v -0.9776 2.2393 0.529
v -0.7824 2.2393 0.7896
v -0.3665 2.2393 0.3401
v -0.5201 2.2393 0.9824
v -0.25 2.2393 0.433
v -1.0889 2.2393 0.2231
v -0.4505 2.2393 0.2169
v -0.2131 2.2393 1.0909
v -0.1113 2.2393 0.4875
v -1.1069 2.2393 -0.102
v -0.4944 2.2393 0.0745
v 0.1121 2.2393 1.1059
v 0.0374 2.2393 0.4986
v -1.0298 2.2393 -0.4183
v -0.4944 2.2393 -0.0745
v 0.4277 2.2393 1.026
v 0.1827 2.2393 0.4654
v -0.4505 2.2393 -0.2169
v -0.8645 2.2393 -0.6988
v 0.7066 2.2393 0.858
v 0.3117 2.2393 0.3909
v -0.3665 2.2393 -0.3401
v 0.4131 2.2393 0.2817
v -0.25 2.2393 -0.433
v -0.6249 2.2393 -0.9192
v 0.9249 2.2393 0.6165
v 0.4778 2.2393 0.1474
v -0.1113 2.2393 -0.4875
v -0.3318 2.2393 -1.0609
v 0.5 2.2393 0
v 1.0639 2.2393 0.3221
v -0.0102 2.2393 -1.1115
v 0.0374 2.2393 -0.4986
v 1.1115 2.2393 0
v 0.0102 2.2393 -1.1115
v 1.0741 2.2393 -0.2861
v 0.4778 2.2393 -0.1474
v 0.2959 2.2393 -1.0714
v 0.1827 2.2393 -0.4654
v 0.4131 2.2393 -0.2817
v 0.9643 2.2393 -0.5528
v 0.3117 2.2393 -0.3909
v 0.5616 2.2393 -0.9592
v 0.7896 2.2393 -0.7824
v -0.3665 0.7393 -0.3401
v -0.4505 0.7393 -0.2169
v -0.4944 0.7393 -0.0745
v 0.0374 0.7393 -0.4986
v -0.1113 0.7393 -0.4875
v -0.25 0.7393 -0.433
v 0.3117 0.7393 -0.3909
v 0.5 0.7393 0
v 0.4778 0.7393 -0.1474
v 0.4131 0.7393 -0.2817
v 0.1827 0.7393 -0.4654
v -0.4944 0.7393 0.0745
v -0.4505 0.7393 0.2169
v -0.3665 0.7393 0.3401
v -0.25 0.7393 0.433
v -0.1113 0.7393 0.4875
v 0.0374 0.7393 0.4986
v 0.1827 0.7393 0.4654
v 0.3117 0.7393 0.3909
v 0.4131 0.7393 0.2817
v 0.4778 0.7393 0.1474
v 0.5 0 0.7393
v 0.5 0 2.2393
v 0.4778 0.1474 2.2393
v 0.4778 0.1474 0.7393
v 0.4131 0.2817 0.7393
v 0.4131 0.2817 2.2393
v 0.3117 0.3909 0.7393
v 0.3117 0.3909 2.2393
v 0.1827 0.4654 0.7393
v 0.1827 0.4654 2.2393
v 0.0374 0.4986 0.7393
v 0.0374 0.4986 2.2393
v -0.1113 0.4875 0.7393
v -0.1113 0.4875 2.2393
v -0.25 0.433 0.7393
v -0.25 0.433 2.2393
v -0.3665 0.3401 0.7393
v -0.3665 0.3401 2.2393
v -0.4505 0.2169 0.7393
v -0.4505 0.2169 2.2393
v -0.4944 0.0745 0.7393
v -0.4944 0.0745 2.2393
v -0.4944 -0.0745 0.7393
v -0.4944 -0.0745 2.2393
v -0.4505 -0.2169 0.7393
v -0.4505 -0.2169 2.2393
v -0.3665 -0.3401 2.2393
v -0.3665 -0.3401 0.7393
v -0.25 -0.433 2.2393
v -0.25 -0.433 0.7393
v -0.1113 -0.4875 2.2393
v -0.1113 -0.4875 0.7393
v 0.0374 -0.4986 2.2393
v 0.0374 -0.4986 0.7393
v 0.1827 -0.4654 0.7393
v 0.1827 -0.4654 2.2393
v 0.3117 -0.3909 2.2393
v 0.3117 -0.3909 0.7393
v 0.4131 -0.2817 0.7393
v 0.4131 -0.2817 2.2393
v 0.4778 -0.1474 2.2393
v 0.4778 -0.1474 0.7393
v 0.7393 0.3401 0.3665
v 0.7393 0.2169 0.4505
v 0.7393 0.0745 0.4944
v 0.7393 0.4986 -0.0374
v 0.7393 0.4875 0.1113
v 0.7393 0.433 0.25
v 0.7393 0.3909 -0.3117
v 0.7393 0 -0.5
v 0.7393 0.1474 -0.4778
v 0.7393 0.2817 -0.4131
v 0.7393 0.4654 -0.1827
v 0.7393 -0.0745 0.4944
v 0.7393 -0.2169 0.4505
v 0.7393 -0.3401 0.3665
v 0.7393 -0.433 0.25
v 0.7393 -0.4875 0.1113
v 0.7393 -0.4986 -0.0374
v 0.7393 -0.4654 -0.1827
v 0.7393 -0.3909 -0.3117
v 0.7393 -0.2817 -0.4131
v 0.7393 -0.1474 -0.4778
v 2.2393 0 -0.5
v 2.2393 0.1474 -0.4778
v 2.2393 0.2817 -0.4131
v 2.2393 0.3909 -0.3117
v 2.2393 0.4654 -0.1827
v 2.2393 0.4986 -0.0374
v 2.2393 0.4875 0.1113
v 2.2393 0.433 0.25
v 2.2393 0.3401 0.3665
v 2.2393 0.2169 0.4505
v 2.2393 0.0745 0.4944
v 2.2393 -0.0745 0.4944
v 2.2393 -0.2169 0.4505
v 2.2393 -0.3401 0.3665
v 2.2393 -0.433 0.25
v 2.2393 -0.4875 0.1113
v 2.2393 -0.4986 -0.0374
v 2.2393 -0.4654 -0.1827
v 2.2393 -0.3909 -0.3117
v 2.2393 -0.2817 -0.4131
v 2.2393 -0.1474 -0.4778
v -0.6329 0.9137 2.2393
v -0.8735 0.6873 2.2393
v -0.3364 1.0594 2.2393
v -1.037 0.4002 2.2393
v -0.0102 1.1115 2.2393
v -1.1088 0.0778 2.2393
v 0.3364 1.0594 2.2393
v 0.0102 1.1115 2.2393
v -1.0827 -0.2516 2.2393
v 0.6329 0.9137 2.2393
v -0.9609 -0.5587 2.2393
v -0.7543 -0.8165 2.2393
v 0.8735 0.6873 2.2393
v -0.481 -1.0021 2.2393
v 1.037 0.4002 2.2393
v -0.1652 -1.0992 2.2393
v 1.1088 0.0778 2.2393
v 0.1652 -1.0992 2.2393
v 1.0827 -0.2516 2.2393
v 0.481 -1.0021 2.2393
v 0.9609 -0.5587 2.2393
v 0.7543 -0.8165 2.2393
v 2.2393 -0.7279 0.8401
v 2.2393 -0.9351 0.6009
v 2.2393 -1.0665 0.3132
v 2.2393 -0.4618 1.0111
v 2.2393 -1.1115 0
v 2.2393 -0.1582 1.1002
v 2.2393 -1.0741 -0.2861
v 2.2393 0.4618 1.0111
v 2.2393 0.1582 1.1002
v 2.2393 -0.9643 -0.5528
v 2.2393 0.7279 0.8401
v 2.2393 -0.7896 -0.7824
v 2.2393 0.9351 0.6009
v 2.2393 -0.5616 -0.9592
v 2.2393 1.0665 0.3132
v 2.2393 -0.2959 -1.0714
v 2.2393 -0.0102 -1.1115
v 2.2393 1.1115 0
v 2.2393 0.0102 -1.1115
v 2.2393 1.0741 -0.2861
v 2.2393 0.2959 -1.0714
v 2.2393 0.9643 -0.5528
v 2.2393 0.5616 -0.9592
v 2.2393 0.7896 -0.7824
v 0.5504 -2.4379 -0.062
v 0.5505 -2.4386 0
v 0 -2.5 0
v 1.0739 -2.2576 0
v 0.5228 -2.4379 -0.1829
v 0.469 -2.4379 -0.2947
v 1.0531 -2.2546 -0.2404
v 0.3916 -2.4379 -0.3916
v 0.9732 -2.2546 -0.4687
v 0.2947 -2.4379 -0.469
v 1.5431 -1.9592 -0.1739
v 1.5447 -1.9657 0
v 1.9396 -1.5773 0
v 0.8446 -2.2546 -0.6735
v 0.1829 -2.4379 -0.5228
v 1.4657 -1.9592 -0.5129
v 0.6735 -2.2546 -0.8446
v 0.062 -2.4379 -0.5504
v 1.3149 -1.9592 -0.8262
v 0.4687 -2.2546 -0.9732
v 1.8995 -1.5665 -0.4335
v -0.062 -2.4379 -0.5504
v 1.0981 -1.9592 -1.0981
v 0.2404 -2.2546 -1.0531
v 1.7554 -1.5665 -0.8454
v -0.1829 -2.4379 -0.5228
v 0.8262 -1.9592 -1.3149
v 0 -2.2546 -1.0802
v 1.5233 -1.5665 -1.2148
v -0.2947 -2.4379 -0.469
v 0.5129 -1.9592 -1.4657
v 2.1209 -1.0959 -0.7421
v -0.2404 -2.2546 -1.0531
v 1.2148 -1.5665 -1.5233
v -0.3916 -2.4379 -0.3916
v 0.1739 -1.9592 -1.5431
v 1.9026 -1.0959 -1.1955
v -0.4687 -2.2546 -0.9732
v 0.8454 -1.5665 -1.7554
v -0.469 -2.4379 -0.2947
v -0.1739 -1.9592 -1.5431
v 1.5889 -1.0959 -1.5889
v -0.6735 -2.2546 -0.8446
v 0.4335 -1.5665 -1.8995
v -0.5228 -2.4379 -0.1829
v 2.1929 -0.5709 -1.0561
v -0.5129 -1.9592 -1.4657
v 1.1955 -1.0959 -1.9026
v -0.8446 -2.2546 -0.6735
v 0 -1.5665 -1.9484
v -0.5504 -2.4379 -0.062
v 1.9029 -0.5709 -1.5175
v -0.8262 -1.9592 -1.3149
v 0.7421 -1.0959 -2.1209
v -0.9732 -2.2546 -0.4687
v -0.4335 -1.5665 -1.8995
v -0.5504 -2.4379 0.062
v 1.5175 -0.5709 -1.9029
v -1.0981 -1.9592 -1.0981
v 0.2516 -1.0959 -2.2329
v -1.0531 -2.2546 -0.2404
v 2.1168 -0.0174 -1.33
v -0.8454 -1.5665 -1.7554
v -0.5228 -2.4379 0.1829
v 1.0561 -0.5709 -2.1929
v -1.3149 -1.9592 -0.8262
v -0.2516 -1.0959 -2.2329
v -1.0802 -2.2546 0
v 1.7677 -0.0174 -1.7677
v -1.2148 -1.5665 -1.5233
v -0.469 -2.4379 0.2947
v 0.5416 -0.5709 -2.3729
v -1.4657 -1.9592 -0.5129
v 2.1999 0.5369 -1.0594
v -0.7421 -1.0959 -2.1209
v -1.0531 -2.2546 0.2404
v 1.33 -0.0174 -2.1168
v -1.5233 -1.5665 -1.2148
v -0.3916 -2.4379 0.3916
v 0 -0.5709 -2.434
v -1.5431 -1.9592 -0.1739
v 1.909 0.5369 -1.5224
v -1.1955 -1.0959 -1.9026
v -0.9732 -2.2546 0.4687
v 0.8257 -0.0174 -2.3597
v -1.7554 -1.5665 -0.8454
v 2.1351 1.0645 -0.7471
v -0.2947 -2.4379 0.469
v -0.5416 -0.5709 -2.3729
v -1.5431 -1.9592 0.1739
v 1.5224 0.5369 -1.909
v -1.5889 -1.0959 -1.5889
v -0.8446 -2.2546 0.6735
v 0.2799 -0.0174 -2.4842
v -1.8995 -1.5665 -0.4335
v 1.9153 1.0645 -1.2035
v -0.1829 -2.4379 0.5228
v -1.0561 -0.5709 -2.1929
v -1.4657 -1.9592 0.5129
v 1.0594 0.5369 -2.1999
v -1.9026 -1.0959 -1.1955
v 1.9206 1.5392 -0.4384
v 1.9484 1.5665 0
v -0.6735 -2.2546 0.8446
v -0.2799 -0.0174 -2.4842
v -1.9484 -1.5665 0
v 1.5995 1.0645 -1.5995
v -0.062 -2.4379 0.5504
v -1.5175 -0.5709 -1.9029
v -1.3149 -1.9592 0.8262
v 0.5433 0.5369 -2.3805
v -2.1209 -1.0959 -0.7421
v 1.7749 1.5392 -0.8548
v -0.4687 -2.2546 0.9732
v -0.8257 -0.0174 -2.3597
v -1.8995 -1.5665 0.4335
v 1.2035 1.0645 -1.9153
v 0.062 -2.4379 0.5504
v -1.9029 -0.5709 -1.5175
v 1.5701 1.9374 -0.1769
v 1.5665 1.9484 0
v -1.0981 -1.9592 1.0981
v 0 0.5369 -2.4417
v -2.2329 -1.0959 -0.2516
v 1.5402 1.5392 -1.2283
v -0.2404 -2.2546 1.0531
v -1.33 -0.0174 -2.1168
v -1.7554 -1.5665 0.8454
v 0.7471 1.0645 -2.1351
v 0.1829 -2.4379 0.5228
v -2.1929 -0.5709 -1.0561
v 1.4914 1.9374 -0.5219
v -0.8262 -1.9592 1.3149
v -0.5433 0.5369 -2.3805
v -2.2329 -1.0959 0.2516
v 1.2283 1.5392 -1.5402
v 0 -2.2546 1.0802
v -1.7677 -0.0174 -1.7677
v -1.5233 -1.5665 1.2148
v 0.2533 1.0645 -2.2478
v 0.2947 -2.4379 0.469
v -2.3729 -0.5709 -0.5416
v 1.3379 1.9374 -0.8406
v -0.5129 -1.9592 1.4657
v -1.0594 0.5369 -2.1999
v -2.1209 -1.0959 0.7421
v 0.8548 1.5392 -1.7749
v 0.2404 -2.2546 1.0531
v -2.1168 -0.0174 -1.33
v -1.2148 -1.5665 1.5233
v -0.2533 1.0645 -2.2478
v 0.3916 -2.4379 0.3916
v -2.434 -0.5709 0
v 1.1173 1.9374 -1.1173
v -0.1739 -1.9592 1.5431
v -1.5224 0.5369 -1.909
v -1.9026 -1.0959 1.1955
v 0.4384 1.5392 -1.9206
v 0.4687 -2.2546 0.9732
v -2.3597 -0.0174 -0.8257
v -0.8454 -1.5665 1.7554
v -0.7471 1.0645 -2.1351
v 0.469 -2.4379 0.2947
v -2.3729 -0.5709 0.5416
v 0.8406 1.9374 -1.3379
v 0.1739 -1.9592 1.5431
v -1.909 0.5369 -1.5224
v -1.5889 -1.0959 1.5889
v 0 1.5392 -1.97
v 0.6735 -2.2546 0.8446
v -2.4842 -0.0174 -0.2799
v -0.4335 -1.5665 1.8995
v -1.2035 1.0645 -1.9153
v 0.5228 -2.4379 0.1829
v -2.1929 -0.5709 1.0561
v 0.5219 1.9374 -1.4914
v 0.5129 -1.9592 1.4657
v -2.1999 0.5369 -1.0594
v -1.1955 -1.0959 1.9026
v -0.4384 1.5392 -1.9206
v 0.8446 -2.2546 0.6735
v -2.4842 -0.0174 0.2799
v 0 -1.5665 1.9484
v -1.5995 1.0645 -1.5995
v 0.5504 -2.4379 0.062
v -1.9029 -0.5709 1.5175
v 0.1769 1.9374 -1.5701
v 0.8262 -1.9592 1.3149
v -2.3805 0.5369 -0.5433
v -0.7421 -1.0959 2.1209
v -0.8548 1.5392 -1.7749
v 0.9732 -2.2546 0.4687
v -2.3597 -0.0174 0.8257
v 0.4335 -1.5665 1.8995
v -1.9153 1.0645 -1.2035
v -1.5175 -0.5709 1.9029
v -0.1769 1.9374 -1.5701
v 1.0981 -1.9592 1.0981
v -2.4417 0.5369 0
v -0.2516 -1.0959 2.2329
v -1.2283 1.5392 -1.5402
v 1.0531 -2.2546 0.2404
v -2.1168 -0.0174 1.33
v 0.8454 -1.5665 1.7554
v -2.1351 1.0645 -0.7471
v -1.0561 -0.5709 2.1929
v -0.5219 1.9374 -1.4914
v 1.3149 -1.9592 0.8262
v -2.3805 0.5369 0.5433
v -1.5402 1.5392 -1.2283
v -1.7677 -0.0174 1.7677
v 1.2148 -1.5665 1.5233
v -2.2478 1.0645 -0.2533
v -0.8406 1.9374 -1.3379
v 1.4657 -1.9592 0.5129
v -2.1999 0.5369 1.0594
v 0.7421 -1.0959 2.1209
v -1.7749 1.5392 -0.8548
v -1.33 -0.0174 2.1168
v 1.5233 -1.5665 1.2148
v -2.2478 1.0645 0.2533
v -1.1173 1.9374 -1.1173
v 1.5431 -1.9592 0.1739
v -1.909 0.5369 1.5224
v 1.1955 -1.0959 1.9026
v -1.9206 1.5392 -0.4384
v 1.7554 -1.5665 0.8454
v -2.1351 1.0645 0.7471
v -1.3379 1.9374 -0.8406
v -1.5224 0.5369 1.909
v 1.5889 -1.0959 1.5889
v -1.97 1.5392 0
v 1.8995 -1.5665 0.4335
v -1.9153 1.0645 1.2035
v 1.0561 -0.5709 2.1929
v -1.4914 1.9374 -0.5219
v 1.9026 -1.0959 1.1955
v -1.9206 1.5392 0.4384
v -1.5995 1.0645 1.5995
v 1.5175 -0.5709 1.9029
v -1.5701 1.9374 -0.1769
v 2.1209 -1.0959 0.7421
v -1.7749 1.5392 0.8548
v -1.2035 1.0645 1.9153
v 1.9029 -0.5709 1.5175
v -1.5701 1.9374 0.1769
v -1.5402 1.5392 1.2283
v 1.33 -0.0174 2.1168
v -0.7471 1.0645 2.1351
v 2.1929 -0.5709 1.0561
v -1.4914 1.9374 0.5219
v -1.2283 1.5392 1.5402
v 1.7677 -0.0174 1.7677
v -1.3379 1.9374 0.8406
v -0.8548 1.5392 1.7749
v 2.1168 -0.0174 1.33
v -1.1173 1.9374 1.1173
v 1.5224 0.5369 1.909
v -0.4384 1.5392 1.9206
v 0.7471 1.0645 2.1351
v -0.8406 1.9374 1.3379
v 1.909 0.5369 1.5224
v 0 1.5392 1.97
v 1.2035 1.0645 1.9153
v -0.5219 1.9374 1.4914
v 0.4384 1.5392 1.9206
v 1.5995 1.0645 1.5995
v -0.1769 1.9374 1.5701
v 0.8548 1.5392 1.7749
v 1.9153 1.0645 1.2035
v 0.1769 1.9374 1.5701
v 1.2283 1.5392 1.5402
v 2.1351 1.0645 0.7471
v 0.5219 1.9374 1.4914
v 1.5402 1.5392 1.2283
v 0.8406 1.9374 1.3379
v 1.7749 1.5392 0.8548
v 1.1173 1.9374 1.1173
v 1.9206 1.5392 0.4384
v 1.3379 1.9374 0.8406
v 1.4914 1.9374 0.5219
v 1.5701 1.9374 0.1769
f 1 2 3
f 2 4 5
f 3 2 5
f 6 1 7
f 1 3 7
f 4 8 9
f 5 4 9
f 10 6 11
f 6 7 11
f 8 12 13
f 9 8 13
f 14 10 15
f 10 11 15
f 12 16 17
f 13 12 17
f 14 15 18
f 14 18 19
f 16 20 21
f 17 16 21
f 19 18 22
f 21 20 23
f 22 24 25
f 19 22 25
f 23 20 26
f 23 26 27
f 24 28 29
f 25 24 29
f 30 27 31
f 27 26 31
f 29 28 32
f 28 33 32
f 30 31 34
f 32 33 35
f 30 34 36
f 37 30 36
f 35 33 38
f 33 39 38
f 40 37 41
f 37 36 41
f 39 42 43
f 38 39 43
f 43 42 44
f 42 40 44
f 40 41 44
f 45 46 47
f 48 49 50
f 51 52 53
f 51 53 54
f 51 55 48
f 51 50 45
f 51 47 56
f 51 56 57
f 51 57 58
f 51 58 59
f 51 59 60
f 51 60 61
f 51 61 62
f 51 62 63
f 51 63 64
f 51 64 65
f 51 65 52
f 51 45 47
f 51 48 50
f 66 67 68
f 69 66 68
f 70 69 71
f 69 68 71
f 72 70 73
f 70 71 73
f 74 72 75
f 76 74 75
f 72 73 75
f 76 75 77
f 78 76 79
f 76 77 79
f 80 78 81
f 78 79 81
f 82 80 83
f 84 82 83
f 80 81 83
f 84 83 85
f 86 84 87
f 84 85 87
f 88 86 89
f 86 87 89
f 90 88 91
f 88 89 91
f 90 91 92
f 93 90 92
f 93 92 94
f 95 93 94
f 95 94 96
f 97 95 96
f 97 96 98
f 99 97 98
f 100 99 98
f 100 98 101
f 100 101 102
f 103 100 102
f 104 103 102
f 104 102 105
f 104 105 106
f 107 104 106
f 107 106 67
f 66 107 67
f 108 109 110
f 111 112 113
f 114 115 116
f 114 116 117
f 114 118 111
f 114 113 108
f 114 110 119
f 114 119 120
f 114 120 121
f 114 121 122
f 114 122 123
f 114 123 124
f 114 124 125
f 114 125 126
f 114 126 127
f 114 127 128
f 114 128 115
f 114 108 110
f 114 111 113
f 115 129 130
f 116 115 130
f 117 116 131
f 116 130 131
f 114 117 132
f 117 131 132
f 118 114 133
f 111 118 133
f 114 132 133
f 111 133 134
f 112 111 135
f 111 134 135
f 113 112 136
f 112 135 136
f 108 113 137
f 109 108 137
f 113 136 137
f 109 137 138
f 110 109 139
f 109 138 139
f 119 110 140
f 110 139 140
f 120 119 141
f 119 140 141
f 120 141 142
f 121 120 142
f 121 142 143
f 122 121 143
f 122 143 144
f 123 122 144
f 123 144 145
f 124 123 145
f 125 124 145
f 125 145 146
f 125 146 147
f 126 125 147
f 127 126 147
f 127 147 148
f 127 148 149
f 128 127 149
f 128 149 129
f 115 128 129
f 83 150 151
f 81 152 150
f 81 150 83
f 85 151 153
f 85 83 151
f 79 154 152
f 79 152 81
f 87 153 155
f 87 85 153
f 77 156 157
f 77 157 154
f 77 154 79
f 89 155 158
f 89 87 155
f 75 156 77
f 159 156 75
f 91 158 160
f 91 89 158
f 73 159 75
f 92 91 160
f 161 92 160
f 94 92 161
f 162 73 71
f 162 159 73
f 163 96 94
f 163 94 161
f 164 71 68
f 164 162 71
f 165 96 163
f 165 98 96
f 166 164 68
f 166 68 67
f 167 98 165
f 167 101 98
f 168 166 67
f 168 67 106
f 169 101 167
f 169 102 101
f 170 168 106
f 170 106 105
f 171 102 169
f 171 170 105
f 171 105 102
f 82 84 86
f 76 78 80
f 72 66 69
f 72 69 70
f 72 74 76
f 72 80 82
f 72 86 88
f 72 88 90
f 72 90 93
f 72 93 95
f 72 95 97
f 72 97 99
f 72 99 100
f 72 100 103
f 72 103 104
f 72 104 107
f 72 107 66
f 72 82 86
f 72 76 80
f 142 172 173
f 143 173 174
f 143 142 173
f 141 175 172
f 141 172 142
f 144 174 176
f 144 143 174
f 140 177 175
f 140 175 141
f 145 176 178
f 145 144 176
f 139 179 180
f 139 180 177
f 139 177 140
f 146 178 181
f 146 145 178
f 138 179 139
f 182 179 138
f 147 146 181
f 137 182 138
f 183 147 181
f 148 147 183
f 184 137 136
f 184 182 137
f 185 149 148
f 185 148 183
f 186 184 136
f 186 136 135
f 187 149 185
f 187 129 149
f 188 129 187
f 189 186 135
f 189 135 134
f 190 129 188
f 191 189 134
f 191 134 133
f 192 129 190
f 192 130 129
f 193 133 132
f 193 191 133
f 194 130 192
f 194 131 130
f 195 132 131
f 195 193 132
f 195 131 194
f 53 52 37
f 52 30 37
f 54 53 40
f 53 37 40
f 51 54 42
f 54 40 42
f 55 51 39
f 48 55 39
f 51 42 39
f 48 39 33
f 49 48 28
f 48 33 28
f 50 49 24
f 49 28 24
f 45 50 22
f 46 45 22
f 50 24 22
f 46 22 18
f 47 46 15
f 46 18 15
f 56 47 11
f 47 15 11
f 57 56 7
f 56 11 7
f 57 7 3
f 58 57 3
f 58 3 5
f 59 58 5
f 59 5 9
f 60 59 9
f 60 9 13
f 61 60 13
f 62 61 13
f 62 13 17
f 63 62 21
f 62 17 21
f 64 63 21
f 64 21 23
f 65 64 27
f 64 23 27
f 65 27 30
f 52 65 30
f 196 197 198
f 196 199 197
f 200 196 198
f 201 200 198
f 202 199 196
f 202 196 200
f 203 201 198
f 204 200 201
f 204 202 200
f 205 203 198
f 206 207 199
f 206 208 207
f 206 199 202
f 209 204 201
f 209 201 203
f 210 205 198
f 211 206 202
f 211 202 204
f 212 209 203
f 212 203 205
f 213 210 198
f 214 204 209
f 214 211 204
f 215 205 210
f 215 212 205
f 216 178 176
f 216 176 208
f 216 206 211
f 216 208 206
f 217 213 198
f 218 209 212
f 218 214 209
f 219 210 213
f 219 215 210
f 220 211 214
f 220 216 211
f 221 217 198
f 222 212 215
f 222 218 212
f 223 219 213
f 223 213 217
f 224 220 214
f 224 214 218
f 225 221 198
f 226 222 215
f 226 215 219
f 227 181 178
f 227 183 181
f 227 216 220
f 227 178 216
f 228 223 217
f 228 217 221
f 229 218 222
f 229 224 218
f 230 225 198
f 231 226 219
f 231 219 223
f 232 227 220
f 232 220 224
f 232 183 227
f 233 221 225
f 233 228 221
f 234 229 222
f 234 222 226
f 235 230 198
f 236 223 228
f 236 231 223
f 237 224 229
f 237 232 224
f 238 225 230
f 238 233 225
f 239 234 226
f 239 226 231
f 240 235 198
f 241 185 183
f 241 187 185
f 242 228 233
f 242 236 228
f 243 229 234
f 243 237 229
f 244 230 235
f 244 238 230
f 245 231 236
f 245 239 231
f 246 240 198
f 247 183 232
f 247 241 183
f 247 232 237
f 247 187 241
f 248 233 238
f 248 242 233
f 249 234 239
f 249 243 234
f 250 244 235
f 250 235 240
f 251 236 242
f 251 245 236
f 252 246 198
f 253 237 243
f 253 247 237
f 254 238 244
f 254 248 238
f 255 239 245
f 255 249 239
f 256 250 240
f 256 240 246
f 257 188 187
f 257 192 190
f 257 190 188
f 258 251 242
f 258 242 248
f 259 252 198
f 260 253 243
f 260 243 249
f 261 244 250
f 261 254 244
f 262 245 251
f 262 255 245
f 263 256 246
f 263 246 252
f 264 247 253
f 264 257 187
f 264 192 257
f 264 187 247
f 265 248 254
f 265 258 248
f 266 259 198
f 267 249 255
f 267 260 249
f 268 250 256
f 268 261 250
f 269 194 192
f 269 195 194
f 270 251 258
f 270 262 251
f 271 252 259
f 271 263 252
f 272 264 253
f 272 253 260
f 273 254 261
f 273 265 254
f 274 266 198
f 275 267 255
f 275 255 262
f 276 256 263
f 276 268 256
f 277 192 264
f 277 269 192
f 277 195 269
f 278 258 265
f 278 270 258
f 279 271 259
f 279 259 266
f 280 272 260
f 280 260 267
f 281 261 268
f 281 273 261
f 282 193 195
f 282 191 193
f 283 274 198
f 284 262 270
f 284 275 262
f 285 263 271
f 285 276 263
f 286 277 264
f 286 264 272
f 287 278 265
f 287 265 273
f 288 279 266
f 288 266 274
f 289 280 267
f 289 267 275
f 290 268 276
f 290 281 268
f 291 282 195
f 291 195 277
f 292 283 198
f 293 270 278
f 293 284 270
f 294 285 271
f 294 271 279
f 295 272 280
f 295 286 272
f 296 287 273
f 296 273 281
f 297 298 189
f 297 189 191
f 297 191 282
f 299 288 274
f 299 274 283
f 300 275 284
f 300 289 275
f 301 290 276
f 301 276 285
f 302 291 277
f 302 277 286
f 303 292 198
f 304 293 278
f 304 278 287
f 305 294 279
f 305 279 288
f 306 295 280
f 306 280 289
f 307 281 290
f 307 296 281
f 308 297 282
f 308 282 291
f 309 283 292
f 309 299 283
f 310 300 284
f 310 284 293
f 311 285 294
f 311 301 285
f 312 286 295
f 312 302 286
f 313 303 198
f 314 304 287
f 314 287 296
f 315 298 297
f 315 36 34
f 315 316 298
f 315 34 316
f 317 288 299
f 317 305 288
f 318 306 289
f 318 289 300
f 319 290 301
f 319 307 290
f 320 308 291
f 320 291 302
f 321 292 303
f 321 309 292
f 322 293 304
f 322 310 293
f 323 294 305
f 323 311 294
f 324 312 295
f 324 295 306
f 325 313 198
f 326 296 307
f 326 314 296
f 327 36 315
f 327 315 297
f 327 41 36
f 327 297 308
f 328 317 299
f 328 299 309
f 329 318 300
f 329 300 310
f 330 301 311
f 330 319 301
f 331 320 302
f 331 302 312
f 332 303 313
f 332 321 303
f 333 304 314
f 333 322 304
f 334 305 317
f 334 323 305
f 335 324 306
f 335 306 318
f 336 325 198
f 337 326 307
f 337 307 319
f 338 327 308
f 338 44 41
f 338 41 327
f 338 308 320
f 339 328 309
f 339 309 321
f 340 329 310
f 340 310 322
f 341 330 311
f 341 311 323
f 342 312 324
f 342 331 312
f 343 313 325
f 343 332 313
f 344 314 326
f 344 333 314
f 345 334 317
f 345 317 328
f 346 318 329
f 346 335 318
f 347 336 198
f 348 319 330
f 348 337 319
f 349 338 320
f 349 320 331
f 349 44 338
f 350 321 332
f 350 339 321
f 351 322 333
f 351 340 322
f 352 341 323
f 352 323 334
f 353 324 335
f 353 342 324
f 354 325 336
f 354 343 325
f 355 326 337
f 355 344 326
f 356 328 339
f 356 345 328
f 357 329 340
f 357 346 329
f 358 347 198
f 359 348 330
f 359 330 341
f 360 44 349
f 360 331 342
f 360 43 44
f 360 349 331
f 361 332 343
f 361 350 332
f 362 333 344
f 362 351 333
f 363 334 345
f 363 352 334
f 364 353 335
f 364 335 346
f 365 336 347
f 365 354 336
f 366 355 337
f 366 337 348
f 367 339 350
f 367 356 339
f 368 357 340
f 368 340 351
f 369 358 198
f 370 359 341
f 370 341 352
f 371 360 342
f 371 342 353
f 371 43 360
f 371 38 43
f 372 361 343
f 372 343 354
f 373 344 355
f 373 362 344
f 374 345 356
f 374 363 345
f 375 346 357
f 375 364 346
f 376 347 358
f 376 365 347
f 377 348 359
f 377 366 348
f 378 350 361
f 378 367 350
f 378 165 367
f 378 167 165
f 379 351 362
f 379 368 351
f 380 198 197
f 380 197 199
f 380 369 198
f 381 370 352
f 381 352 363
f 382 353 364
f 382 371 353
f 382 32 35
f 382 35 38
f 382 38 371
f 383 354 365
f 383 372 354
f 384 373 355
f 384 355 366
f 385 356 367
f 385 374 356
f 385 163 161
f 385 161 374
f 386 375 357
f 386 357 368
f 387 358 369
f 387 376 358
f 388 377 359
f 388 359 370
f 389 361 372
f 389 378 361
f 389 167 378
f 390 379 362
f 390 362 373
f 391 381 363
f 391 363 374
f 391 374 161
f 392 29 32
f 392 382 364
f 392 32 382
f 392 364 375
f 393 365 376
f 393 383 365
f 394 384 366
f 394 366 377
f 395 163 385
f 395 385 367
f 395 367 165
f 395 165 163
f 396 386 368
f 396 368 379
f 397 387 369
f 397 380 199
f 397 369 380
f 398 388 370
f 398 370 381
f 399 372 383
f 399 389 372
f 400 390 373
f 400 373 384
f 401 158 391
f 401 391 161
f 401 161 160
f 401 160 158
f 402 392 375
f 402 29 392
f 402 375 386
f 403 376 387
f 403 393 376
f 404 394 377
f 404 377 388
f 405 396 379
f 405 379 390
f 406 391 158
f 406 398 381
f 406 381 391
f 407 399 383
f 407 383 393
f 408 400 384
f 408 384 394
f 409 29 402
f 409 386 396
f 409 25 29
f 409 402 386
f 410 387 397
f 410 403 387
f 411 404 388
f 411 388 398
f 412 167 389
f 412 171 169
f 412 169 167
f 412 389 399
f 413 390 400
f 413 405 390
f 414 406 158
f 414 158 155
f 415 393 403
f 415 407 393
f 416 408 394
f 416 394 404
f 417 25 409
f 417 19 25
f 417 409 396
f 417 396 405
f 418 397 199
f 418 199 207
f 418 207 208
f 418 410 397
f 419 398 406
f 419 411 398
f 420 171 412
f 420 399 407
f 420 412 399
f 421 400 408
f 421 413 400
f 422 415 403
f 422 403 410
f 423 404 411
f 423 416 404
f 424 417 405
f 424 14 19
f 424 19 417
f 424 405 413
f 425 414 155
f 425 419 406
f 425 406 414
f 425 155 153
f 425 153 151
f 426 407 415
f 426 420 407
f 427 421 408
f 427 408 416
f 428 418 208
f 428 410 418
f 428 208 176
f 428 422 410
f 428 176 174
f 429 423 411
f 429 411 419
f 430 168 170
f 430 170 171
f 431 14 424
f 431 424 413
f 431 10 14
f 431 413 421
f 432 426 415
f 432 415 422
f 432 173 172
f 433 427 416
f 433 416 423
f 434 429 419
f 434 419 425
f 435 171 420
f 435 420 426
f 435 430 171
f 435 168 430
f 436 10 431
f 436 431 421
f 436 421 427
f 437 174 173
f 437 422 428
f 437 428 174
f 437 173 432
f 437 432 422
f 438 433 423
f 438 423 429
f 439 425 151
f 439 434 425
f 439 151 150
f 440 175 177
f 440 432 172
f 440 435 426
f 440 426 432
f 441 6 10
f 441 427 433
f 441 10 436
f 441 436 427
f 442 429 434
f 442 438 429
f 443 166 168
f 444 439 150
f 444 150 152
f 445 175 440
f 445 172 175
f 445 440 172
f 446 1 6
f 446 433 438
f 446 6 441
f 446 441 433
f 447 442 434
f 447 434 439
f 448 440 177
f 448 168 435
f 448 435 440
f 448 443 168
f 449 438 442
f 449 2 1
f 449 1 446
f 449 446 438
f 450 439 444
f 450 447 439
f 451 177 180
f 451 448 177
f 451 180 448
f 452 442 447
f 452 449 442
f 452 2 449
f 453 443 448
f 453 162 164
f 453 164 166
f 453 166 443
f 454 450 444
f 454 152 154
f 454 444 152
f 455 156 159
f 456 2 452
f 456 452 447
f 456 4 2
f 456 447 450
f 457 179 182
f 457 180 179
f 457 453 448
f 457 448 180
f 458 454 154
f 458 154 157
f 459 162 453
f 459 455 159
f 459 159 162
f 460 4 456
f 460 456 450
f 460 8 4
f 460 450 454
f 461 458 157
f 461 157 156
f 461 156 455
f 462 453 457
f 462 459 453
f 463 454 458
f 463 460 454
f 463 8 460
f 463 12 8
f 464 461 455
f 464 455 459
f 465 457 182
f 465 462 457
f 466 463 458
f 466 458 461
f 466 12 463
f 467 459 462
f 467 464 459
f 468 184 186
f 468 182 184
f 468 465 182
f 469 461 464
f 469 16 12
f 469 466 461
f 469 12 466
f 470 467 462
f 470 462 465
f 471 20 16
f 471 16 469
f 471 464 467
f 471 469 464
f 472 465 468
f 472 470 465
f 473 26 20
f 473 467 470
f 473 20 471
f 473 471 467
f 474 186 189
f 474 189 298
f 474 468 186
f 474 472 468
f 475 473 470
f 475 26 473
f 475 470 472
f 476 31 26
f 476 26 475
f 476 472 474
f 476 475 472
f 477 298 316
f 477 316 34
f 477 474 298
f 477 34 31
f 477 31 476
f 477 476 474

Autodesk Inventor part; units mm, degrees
ref_plane "YZ Plane" through (0, 0, 0) normal (1, 0, 0) x (0, 1, 0)
sketch "Skizze1" plane through (0, 0, 0) normal (0, 0, 1) x (1, 0, 0)
  circle A0 centre (0, 0) radius 2.5
  line L0 (0, 2.5) -> (0, -2.5)
  dimension "d0" = 5
revolve "Umdrehung1" add sketch "Skizze1" angle 360 about axis through (0, 2.5, 0) along (0, -1, 0) picked at (0.5196, 0.6515) contours A0 L0
ref_plane "Arbeitsebene1" through (0, 0, 0) normal (-1, 0, 0) x (0, -1, 0)
sketch "Skizze2" plane through (0, 0, 0) normal (-1, 0, 0) x (0, -1, 0)
  circle A0 centre (0, 0) radius 2.5 projected
  line L0 (1.8885, 2.6999) -> (-1.1115, 2.6999)
  line L1 (-1.1115, 2.6999) -> (-1.1115, 2.2393)
  line L2 (-1.1115, 2.2393) -> (1.8885, 2.2393)
  line L3 (1.8885, 2.2393) -> (1.8885, 2.6999)
  line L4 (1.8885, 2.6999) -> (-1.1115, 2.2393) construction
  line L5 (-1.1115, 2.6999) -> (1.8885, 2.2393) construction
  point P0 (0.3885, 2.4696)
  dimension "d2" = 3
extrude "Extrusion1" cut sketch "Skizze2" along normal mid plane 10 contours L1 L0 L3 L2 A0 | A0 L2 picked at (0.1903, 2.3042)
ref_plane "Arbeitsebene2" through (0, 0, 2.2393) normal (0, -1, 0) x (-1, 0, 0)
sketch "Skizze3" plane through (0, 0, 2.2393) normal (0, -1, 0) x (-1, 0, 0)
  arc A0 (1.1115, 0) -> (-1.1115, 0) centre (0, 2.2393) ccw projected
  line L0 (-2.6999, 0.3508) -> (-2.2393, 0.3508)
  line L1 (-2.2393, 0.3508) -> (-2.2393, 3.3508)
  line L2 (-2.2393, 3.3508) -> (-2.6999, 3.3508)
  line L3 (-2.6999, 3.3508) -> (-2.6999, 0.3508)
  line L4 (-2.6999, 0.3508) -> (-2.2393, 3.3508) construction
  line L5 (-2.2393, 0.3508) -> (-2.6999, 3.3508) construction
  point P0 (-2.4696, 1.8508)
  dimension "d5" = 3
extrude "Extrusion2" cut sketch "Skizze3" along normal mid plane 10
sketch "Skizze4" plane through (0, 0, 0) normal (-1, 0, 0) x (0, -1, 0)
  arc A0 (-1.1115, 2.2393) -> (1.1115, 2.2393) centre (0, 0) ccw projected
  line L0 (-2.6999, 1.8885) -> (-2.2393, 1.8885)
  line L1 (-2.2393, 1.8885) -> (-2.2393, -1.1115)
  line L2 (-2.2393, -1.1115) -> (-2.6999, -1.1115)
  line L3 (-2.6999, -1.1115) -> (-2.6999, 1.8885)
  line L4 (-2.6999, 1.8885) -> (-2.2393, -1.1115) construction
  line L5 (-2.2393, 1.8885) -> (-2.6999, -1.1115) construction
  point P0 (-2.4696, 0.3885)
  dimension "d8" = 3
extrude "Extrusion3" cut sketch "Skizze4" along normal mid plane 10
sketch "Skizze5" plane through (2.2393, 0, 0) normal (1, 0, 0) x (0, 0, -1)
  circle A0 centre (0, 0) radius 1.1115
  circle A1 centre (0, 0) radius 0.5
  dimension "d26" = 1
sketch "Skizze6" plane through (0, 0, 2.2393) normal (0, 0, 1) x (1, 0, 0)
  circle A0 centre (0, 0) radius 1.1115
  circle A1 centre (0, 0) radius 0.5
  dimension "d27" = 1
sketch "Skizze7" plane through (0, 2.2393, 0) normal (0, 1, 0) x (1, 0, 0)
  circle A0 centre (0, 0) radius 1.1115
  circle A1 centre (0, 0) radius 0.5
  dimension "d28" = 1
extrude "Extrusion7" cut sketch "Skizze6" against normal blind 1.5 contours A1
extrude "Extrusion8" cut sketch "Skizze5" against normal blind 1.5 contours A1
extrude "Extrusion9" cut sketch "Skizze7" against normal blind 1.5 contours A1
properties part number "xyz_Axis_with_ball_Ball"
